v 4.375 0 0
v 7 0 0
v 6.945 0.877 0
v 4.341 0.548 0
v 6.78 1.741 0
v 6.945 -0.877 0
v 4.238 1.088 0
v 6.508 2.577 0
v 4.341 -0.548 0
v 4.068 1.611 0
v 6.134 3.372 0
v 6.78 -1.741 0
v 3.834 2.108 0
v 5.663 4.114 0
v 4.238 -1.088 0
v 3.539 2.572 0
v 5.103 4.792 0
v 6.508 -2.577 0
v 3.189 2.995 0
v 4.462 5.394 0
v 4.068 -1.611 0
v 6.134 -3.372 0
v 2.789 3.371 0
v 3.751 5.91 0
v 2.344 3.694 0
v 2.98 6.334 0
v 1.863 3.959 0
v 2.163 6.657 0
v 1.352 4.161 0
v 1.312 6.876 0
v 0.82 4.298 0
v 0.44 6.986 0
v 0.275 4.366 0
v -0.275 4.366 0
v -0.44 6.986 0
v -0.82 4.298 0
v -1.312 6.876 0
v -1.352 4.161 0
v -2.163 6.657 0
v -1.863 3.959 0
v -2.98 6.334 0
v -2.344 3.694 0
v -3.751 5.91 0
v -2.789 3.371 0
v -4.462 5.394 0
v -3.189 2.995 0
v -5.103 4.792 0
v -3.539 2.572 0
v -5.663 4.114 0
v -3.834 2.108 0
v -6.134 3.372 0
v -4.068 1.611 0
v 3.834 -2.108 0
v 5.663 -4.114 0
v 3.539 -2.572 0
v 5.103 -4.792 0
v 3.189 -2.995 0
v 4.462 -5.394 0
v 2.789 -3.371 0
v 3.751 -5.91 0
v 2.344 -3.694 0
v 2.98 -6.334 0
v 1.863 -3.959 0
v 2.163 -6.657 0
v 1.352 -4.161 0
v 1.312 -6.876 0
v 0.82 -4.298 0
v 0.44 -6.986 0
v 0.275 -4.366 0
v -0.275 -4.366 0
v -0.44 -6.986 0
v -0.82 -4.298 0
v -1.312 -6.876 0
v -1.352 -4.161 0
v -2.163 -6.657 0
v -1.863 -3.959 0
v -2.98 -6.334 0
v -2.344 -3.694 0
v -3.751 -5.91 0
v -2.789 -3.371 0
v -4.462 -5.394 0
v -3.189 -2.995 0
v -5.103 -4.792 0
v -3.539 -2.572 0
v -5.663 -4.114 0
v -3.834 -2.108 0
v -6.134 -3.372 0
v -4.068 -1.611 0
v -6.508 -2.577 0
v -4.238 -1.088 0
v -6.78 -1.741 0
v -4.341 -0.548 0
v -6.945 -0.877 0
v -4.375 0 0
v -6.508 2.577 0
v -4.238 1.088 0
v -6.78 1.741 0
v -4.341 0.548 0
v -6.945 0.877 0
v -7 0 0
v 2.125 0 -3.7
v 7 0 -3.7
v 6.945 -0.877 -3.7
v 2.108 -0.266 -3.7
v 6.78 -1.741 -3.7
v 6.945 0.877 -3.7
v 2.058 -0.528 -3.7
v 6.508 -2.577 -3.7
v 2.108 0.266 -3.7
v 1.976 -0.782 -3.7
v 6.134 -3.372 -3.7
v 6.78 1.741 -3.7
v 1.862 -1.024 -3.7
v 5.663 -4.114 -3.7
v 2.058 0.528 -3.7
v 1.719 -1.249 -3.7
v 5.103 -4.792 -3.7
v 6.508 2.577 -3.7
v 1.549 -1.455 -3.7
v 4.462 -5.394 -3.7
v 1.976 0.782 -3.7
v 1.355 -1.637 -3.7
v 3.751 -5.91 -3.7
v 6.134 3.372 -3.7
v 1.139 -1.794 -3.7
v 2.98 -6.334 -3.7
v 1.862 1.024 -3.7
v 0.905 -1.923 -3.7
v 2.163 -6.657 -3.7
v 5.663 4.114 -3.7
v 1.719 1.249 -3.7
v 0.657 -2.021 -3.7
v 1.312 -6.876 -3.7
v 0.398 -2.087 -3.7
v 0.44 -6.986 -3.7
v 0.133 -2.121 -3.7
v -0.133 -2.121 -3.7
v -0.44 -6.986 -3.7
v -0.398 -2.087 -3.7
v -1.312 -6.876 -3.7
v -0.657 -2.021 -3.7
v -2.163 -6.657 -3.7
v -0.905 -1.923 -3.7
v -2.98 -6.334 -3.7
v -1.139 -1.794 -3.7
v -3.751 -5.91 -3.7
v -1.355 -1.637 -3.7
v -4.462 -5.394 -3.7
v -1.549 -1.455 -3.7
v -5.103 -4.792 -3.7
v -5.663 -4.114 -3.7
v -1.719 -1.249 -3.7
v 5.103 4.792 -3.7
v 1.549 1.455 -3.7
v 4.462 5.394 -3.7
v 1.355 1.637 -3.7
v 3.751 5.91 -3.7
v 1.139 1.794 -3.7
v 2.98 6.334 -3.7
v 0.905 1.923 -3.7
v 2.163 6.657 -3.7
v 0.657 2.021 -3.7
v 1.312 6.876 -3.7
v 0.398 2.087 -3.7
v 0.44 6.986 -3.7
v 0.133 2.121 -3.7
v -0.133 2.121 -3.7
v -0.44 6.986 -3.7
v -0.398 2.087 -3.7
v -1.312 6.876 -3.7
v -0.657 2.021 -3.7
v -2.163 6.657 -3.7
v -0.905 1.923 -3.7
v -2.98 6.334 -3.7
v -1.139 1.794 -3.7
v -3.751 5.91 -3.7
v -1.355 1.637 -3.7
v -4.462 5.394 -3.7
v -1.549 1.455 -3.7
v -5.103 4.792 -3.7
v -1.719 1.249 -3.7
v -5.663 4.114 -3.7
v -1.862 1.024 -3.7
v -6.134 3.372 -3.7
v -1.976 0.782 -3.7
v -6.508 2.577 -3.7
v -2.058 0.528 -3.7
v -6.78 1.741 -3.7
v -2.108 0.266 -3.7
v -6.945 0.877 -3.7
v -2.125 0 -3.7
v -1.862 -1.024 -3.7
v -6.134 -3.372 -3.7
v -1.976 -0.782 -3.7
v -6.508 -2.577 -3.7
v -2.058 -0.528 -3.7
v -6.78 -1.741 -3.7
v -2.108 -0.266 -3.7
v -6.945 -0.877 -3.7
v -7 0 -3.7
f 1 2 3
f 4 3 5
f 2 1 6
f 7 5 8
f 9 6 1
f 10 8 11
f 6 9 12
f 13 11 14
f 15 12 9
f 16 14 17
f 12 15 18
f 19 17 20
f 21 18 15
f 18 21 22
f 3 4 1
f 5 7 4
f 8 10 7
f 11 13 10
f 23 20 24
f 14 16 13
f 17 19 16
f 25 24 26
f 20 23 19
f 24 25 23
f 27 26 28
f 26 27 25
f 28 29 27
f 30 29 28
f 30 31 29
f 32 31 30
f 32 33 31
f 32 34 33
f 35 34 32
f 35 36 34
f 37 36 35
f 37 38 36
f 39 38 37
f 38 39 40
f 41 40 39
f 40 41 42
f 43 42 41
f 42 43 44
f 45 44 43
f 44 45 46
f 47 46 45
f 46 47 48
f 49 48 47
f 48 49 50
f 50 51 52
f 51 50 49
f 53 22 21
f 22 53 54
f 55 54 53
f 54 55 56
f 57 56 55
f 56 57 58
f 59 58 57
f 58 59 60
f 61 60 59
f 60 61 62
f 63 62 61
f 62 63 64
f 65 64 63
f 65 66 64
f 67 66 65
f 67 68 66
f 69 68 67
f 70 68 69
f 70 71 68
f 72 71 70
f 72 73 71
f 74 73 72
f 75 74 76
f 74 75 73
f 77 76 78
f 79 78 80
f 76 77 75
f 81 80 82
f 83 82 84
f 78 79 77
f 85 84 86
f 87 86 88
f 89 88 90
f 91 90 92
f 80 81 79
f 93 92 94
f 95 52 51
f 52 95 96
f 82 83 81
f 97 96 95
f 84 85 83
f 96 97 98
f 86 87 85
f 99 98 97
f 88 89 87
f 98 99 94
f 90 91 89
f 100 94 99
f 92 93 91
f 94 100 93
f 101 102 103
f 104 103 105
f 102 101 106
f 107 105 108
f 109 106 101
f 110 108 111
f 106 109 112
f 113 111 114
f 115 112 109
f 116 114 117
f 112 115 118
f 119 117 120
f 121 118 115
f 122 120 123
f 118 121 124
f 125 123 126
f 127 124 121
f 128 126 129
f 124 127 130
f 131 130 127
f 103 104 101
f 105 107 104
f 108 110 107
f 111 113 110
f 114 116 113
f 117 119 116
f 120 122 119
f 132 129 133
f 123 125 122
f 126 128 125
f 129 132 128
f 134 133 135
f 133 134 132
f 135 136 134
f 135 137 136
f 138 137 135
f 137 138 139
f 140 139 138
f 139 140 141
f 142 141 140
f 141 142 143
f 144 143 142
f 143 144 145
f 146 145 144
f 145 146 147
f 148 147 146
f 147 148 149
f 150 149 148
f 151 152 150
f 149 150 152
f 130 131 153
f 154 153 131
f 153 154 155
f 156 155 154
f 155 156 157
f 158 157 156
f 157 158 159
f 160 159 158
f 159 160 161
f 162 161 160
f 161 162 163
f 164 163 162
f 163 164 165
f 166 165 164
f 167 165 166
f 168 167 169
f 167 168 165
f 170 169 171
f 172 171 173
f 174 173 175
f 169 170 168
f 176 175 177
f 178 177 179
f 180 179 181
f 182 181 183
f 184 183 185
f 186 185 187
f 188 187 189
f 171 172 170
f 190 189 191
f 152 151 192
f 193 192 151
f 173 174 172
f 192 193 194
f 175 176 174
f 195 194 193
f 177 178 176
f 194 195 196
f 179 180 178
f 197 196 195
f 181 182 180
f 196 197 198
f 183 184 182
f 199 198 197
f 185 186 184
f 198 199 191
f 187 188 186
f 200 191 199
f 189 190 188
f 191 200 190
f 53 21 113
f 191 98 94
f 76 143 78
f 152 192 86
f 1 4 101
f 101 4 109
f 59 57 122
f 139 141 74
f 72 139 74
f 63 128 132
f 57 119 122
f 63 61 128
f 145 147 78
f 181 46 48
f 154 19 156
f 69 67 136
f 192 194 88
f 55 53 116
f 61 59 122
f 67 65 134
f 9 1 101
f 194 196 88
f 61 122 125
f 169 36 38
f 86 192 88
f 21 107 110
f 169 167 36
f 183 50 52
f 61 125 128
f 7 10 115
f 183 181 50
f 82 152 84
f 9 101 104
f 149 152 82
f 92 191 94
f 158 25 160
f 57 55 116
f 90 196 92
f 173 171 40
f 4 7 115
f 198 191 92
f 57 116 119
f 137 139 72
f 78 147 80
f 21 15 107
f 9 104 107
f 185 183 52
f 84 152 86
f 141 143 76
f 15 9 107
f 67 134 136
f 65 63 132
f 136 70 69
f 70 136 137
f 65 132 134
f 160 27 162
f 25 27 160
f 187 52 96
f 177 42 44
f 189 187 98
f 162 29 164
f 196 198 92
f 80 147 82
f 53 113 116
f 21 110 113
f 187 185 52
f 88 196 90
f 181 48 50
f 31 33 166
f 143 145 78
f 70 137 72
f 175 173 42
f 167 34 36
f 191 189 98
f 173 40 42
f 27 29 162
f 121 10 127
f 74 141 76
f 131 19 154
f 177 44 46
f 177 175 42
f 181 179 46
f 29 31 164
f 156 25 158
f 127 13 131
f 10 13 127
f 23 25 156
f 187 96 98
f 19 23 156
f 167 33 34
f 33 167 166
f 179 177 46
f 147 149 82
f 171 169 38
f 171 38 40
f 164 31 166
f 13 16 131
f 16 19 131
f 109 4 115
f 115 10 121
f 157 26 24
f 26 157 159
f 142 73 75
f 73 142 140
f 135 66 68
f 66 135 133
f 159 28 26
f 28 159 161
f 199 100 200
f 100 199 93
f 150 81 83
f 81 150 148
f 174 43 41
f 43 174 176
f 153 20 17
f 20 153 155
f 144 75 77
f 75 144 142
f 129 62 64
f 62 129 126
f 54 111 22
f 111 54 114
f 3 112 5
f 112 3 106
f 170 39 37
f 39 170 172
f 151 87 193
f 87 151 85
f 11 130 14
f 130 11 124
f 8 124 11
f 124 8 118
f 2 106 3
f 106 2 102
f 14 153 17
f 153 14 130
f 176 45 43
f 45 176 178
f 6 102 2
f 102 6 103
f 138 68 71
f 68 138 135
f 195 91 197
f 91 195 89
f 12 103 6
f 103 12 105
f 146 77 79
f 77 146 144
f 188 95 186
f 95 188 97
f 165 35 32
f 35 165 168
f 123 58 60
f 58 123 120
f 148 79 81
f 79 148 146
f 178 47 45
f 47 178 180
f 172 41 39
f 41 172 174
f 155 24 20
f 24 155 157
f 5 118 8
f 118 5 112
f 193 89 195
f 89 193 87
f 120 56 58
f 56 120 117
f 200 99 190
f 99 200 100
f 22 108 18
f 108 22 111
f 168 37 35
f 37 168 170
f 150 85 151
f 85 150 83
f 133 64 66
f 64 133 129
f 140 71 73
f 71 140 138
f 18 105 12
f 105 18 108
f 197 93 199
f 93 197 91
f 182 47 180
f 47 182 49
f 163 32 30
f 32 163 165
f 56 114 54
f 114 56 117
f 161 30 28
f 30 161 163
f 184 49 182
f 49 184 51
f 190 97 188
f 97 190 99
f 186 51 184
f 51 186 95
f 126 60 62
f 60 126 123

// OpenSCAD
$fn = 50;


difference() {
	union() {
		translate(v = [0, 0, -3.7000000000]) {
			cylinder(h = 3.7000000000, r = 7.0000000000);
		}
	}
	union() {
		translate(v = [0, 0, 0]) {
			rotate(a = [0, 0, 0]) {
				difference() {
					union() {
						translate(v = [0, 0, -3.7000000000]) {
							cylinder(h = 3.7000000000, r = 2.0000000000);
						}
						translate(v = [0, 0, -3.7000000000]) {
							cylinder(h = 3.7000000000, r1 = 2.1250000000, r2 = 4.3750000000);
						}
						translate(v = [0, 0, -3.7000000000]) {
							cylinder(h = 3.7000000000, r = 2.1250000000);
						}
						translate(v = [0, 0, -3.7000000000]) {
							cylinder(h = 3.7000000000, r = 2.0000000000);
						}
					}
					union();
				}
			}
		}
	}
}
